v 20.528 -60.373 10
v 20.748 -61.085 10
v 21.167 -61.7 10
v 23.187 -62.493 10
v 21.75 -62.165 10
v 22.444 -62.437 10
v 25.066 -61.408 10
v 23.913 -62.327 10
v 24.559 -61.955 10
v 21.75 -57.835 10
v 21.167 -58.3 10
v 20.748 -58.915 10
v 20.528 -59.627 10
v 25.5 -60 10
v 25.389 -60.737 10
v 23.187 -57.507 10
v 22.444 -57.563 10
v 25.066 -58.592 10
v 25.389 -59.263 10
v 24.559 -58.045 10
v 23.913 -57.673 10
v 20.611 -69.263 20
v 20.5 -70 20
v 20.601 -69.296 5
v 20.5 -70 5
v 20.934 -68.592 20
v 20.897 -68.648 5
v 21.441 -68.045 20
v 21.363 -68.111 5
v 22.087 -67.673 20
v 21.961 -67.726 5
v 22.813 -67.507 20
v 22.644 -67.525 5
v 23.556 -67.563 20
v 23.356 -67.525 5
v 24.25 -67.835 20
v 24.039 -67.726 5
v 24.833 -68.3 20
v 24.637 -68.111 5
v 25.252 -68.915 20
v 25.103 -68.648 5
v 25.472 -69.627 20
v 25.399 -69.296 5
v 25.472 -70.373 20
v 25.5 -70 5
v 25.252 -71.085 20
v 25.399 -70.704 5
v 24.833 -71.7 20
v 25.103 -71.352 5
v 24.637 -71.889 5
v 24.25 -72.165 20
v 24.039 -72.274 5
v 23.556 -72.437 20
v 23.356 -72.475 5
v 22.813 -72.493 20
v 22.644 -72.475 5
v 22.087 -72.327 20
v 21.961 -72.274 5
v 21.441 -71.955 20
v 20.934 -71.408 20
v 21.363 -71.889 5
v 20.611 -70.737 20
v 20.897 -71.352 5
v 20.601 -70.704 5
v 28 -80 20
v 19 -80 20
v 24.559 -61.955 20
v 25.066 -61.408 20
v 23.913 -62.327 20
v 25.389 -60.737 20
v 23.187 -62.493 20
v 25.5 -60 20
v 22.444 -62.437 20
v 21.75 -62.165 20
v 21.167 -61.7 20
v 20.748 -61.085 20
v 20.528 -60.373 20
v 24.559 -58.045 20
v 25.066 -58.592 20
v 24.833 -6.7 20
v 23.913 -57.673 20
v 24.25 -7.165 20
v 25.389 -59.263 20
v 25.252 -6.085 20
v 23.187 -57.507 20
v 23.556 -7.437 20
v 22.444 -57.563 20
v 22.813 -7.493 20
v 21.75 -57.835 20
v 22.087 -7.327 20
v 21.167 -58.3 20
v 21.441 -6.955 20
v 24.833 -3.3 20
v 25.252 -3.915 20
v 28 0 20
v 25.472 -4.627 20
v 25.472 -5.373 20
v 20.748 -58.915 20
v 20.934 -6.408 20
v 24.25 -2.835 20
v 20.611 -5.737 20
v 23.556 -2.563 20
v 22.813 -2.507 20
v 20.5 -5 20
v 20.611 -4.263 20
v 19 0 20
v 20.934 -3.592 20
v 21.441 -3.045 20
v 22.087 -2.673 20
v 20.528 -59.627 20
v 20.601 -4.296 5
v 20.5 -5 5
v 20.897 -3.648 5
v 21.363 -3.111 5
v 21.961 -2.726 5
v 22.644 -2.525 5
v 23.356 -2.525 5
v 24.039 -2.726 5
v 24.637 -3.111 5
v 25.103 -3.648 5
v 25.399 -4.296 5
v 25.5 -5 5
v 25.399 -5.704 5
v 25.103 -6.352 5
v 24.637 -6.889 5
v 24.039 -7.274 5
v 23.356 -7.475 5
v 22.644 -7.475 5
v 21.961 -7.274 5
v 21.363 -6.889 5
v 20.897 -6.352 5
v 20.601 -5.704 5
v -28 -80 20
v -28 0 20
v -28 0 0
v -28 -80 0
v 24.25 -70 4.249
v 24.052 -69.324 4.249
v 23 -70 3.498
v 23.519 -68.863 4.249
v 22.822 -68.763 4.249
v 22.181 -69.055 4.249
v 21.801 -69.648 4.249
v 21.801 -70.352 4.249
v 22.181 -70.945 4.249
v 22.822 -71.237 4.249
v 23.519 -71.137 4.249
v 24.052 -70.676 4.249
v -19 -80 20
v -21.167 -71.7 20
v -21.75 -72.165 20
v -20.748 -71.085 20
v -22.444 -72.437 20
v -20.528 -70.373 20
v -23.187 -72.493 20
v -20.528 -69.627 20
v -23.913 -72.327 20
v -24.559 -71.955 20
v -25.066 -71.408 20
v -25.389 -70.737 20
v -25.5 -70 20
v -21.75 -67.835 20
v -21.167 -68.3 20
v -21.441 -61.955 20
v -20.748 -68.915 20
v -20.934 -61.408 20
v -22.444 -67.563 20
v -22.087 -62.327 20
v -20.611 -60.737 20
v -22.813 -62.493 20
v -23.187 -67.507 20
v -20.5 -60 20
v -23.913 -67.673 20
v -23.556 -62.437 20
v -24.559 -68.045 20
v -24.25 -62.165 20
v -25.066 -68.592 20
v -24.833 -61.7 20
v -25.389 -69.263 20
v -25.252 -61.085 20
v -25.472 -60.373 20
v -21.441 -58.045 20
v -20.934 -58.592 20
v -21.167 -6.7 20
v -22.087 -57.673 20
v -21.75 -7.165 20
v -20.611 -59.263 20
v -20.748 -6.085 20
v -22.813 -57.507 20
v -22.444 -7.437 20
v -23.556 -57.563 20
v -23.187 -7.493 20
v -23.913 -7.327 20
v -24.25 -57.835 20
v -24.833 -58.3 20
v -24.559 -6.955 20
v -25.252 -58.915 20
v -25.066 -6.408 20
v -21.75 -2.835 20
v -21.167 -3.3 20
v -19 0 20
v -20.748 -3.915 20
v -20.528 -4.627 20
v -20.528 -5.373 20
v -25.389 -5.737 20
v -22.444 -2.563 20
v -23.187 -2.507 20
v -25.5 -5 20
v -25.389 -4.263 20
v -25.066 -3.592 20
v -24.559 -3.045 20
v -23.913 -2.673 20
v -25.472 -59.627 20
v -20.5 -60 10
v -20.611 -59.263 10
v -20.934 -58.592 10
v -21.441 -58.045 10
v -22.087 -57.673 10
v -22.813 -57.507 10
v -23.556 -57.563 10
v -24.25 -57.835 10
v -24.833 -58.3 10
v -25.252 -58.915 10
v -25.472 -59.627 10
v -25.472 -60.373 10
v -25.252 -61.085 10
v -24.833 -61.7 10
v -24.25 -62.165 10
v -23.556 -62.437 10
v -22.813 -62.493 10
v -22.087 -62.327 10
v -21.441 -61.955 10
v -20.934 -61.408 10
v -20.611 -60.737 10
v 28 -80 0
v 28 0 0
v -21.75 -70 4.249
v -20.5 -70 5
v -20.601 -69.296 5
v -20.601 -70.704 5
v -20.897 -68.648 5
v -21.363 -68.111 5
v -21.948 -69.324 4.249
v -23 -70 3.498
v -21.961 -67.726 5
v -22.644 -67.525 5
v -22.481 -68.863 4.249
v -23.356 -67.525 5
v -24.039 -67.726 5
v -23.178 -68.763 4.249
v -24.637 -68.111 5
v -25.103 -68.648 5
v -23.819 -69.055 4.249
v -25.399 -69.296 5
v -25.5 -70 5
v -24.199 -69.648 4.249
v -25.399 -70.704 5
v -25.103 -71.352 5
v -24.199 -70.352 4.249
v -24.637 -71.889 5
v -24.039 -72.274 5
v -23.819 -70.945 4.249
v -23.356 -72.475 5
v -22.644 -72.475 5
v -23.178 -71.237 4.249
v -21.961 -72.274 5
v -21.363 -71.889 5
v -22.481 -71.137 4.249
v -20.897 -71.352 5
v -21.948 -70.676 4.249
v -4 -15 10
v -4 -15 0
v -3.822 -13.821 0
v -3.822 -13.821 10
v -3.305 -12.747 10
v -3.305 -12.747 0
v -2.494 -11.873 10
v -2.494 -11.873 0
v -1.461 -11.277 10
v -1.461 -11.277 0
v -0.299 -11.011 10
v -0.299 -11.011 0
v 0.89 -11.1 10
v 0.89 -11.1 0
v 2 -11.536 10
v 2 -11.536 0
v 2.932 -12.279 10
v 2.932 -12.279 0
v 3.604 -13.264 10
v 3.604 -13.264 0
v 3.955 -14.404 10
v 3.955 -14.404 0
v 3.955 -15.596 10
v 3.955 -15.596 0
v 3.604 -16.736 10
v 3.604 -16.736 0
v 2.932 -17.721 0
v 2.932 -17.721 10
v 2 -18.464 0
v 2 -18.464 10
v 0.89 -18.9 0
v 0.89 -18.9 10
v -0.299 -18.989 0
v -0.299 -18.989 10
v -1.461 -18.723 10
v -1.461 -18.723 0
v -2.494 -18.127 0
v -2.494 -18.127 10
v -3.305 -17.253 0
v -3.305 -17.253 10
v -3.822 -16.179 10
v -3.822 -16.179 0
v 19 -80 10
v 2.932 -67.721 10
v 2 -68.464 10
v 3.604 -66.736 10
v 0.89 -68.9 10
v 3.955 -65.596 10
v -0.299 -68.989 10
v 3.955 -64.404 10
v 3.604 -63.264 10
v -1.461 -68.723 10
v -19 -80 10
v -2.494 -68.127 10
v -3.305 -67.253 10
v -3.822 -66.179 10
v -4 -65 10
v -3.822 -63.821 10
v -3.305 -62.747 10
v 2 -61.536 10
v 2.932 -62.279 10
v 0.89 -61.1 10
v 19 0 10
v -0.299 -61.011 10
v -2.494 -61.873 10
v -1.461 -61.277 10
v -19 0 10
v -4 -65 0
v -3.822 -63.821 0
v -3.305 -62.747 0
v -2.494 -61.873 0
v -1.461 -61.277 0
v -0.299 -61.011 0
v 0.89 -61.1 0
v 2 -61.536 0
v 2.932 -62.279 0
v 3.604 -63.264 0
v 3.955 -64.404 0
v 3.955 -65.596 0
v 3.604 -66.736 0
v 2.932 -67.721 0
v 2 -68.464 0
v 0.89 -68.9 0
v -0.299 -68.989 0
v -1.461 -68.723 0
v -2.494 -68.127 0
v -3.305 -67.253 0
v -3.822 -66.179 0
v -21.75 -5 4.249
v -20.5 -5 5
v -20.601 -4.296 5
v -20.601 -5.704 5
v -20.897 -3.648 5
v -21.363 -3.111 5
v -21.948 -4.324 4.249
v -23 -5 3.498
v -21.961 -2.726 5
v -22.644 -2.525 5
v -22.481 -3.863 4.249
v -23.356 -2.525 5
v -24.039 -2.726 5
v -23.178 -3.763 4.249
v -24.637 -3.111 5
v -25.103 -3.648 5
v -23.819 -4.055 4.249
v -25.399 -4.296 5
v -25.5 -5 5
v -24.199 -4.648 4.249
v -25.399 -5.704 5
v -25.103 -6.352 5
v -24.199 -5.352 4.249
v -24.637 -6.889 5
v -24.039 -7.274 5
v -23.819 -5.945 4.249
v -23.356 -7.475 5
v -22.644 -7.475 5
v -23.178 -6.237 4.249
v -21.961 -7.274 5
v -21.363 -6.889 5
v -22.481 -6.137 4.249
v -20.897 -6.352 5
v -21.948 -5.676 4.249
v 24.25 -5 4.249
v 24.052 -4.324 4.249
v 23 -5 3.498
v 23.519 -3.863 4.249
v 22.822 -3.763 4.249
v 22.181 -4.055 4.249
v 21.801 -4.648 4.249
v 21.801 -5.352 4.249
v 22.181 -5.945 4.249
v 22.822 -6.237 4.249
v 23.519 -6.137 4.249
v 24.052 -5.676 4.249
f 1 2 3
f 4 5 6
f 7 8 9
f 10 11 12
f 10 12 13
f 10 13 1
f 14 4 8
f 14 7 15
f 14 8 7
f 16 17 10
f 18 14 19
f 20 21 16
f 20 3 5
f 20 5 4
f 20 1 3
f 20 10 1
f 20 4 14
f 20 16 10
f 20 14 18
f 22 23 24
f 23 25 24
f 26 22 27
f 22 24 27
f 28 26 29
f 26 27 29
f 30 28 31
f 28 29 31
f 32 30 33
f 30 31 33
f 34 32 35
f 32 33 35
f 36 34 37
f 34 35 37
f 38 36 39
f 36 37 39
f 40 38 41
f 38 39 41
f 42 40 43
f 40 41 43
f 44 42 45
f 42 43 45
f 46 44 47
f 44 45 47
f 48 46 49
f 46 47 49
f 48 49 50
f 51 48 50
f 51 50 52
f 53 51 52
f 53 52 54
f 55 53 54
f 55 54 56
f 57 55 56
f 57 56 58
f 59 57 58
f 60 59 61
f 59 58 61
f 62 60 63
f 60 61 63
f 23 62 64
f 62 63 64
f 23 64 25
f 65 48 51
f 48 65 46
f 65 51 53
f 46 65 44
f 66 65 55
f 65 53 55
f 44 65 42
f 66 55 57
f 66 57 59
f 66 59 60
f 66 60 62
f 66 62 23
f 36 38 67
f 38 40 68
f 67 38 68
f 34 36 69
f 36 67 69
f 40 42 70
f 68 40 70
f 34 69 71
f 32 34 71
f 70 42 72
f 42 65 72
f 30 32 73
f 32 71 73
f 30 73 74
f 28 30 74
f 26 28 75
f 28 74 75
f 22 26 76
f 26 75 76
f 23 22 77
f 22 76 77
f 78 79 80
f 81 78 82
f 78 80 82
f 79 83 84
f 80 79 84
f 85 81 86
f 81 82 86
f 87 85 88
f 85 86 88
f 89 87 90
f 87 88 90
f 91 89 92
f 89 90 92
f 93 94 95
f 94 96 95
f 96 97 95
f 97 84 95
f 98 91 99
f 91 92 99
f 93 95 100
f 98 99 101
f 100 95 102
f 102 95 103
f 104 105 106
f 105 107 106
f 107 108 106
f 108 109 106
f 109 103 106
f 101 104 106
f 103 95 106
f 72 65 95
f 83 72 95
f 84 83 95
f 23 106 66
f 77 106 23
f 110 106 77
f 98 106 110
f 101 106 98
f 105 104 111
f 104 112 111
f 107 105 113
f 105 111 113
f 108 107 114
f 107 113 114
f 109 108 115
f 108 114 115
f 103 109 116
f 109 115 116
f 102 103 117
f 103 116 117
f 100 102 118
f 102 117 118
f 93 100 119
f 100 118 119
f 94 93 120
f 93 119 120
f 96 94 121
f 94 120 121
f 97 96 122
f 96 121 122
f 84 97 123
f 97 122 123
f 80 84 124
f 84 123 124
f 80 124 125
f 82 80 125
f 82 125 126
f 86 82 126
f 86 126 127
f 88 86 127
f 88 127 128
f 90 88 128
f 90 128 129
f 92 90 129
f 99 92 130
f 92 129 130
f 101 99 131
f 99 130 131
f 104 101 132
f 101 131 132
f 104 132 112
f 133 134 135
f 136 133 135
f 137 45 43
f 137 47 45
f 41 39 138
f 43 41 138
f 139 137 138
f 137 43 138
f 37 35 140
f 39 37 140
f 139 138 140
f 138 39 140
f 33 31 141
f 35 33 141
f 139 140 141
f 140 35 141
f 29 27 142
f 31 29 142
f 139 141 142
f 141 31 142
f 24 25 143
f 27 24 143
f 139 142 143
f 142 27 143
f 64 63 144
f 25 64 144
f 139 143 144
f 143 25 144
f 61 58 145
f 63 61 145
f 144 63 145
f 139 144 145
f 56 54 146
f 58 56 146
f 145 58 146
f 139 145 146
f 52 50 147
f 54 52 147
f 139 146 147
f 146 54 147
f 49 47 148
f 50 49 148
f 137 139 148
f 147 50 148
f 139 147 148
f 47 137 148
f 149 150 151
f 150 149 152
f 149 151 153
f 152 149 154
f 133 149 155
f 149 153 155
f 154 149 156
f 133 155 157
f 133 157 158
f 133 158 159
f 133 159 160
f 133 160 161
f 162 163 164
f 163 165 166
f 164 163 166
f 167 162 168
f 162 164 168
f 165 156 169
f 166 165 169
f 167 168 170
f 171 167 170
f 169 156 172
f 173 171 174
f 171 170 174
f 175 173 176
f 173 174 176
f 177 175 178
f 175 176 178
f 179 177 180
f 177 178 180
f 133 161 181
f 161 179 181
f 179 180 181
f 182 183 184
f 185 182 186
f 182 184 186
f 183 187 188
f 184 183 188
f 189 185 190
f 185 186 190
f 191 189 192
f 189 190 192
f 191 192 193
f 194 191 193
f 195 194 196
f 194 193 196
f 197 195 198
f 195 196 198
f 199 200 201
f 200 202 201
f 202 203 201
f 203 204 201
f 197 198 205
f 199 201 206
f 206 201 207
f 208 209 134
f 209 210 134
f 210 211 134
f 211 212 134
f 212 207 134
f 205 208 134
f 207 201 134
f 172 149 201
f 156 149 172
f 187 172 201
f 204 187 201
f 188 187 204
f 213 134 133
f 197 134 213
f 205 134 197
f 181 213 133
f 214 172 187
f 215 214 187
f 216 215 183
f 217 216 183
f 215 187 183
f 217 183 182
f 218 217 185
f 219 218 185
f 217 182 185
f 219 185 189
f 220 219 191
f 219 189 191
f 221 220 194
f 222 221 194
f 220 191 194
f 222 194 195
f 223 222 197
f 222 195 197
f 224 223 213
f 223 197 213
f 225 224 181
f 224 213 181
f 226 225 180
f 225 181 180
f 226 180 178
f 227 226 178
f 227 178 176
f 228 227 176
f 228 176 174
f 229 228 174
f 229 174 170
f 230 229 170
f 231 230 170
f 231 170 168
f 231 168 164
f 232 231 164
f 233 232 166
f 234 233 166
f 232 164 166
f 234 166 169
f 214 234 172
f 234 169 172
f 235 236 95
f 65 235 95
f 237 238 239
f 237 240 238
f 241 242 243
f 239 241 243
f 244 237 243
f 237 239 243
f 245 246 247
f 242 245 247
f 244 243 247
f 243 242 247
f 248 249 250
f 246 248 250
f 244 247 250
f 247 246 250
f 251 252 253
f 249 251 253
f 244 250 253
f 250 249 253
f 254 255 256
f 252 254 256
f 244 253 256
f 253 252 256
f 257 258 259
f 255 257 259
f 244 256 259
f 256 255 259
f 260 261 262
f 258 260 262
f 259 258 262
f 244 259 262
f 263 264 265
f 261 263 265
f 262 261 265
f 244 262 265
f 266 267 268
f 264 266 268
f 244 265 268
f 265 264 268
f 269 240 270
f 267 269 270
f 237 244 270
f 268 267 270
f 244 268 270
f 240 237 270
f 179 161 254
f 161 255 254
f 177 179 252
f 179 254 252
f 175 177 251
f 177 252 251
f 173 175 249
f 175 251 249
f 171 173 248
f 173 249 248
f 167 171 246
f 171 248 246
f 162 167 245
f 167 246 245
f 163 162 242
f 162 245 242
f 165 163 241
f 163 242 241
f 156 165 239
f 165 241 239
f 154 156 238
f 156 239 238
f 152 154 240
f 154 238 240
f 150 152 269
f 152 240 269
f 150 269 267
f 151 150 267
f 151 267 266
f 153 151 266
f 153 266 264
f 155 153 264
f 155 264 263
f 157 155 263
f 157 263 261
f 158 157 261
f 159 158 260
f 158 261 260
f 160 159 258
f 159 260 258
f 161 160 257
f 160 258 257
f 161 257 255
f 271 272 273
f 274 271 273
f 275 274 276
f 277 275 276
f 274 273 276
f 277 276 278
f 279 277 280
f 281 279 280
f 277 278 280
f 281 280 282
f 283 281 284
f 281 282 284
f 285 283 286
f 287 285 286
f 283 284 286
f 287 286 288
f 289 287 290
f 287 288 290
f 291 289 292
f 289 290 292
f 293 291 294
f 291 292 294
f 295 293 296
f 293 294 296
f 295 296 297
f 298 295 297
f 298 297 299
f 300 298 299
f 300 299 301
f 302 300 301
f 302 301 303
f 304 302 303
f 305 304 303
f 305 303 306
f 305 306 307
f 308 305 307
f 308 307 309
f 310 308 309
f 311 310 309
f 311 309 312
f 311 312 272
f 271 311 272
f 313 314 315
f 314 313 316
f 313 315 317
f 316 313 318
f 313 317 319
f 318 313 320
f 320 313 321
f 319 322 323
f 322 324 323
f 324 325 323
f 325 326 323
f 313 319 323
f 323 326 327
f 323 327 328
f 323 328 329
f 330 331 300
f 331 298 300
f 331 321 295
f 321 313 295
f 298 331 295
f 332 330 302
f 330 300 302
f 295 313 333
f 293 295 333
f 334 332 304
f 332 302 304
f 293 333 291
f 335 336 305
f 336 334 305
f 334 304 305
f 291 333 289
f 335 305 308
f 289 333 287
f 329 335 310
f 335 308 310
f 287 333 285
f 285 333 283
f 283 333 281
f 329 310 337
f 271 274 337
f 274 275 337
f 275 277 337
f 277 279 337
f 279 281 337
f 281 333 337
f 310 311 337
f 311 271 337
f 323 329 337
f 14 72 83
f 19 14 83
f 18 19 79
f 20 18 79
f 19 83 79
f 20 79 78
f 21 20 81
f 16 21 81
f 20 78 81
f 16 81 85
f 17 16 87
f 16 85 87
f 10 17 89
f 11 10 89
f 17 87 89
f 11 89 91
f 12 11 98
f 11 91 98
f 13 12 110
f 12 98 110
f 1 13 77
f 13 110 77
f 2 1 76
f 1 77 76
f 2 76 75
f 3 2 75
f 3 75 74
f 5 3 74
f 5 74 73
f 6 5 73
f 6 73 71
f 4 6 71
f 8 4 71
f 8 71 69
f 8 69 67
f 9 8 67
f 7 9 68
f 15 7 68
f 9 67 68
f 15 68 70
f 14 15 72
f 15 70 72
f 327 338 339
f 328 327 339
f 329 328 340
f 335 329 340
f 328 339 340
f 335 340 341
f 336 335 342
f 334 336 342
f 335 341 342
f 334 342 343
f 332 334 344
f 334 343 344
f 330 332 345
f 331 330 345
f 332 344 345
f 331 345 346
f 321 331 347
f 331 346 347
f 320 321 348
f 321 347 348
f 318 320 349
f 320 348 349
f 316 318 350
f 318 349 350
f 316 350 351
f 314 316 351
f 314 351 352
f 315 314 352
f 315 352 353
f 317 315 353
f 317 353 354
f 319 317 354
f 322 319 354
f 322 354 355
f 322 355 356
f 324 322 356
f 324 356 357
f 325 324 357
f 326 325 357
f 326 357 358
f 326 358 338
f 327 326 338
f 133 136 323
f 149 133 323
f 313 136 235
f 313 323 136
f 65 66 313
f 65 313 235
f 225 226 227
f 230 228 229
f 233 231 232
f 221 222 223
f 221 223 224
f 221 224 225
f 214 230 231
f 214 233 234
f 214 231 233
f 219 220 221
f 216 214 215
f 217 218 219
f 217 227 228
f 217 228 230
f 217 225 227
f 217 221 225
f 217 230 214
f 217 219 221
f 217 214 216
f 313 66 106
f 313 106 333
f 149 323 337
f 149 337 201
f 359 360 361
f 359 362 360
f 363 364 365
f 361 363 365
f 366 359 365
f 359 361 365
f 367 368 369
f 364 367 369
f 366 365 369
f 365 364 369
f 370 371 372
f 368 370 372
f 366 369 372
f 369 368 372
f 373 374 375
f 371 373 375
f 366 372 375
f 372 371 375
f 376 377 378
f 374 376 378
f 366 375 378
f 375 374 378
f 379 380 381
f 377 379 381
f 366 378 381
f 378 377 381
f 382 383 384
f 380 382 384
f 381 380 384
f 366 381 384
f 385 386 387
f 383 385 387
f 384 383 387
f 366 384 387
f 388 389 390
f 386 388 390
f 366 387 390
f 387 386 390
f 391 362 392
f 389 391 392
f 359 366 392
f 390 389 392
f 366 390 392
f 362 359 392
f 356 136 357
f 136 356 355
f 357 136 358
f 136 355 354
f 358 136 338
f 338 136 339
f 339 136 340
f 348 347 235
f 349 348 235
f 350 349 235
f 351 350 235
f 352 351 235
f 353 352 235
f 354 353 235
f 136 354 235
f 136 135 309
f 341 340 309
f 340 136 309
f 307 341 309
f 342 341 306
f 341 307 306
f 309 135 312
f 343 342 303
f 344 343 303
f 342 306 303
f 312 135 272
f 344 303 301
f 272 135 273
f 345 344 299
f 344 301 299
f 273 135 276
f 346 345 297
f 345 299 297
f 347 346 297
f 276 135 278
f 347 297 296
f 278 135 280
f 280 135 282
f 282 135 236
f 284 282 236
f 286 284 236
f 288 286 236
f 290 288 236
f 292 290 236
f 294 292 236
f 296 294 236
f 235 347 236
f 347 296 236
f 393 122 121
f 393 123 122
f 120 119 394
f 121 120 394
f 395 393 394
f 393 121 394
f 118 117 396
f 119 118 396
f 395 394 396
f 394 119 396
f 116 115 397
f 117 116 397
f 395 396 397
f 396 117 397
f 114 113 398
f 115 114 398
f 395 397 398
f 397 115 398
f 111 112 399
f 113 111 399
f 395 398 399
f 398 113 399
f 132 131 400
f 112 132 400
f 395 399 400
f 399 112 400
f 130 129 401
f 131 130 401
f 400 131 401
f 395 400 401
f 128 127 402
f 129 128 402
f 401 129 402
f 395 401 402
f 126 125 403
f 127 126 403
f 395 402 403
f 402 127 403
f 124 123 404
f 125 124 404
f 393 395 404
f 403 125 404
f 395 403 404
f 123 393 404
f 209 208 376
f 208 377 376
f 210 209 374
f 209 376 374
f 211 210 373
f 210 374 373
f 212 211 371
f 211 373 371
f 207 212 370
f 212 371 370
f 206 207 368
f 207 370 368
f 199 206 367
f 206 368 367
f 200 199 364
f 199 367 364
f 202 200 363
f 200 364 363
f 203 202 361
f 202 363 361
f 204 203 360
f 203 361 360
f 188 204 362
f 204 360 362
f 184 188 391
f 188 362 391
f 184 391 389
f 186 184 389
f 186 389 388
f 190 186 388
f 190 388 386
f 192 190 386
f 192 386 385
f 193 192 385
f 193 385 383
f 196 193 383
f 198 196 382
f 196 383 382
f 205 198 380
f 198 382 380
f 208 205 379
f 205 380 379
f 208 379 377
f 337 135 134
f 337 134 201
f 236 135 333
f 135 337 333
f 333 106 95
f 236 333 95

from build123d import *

# Parameters (mm, degrees)
F1_DEPTH = 80
F2_R     = 2.5
F3_DEPTH = 10
F5_D     = 5
F5_DEPTH = 15
F5_TIP   = 1.5021515476
F7_D     = 8


with BuildPart() as f1:
    # F0 (on Front) → F1 (new body)
    with BuildSketch(Plane.XZ):
        Polygon((-19, 20), (-28, 20), (-28, 0), (28, 0), (28, 20), (19, 20), (19, 10), (-19, 10), align=None)
    extrude(amount=F1_DEPTH)

    # F2 (on face) → F3 (cut)
    with BuildSketch(Plane.XY.offset(20)):
        with Locations((23, -60)):
            Circle(F2_R)
        with Locations((-23, -60)):
            Circle(F2_R)
    extrude(amount=-F3_DEPTH, mode=Mode.SUBTRACT)

    # F5
    with Locations(Plane.XY.offset(20)):
        with Locations((-23, -5), (23, -5), (23, -70), (-23, -70)):
            Hole(F5_D / 2, depth=F5_DEPTH)
            with Locations((0, 0, -(F5_DEPTH + F5_TIP / 2))):  # 118° drill point
                Cone(0, F5_D / 2, F5_TIP, mode=Mode.SUBTRACT)

    # F7 (through all)
    with Locations(Plane.XY.offset(10)):
        with Locations((0, -15), (0, -65)):
            Hole(F7_D / 2)


solid = f1.part
